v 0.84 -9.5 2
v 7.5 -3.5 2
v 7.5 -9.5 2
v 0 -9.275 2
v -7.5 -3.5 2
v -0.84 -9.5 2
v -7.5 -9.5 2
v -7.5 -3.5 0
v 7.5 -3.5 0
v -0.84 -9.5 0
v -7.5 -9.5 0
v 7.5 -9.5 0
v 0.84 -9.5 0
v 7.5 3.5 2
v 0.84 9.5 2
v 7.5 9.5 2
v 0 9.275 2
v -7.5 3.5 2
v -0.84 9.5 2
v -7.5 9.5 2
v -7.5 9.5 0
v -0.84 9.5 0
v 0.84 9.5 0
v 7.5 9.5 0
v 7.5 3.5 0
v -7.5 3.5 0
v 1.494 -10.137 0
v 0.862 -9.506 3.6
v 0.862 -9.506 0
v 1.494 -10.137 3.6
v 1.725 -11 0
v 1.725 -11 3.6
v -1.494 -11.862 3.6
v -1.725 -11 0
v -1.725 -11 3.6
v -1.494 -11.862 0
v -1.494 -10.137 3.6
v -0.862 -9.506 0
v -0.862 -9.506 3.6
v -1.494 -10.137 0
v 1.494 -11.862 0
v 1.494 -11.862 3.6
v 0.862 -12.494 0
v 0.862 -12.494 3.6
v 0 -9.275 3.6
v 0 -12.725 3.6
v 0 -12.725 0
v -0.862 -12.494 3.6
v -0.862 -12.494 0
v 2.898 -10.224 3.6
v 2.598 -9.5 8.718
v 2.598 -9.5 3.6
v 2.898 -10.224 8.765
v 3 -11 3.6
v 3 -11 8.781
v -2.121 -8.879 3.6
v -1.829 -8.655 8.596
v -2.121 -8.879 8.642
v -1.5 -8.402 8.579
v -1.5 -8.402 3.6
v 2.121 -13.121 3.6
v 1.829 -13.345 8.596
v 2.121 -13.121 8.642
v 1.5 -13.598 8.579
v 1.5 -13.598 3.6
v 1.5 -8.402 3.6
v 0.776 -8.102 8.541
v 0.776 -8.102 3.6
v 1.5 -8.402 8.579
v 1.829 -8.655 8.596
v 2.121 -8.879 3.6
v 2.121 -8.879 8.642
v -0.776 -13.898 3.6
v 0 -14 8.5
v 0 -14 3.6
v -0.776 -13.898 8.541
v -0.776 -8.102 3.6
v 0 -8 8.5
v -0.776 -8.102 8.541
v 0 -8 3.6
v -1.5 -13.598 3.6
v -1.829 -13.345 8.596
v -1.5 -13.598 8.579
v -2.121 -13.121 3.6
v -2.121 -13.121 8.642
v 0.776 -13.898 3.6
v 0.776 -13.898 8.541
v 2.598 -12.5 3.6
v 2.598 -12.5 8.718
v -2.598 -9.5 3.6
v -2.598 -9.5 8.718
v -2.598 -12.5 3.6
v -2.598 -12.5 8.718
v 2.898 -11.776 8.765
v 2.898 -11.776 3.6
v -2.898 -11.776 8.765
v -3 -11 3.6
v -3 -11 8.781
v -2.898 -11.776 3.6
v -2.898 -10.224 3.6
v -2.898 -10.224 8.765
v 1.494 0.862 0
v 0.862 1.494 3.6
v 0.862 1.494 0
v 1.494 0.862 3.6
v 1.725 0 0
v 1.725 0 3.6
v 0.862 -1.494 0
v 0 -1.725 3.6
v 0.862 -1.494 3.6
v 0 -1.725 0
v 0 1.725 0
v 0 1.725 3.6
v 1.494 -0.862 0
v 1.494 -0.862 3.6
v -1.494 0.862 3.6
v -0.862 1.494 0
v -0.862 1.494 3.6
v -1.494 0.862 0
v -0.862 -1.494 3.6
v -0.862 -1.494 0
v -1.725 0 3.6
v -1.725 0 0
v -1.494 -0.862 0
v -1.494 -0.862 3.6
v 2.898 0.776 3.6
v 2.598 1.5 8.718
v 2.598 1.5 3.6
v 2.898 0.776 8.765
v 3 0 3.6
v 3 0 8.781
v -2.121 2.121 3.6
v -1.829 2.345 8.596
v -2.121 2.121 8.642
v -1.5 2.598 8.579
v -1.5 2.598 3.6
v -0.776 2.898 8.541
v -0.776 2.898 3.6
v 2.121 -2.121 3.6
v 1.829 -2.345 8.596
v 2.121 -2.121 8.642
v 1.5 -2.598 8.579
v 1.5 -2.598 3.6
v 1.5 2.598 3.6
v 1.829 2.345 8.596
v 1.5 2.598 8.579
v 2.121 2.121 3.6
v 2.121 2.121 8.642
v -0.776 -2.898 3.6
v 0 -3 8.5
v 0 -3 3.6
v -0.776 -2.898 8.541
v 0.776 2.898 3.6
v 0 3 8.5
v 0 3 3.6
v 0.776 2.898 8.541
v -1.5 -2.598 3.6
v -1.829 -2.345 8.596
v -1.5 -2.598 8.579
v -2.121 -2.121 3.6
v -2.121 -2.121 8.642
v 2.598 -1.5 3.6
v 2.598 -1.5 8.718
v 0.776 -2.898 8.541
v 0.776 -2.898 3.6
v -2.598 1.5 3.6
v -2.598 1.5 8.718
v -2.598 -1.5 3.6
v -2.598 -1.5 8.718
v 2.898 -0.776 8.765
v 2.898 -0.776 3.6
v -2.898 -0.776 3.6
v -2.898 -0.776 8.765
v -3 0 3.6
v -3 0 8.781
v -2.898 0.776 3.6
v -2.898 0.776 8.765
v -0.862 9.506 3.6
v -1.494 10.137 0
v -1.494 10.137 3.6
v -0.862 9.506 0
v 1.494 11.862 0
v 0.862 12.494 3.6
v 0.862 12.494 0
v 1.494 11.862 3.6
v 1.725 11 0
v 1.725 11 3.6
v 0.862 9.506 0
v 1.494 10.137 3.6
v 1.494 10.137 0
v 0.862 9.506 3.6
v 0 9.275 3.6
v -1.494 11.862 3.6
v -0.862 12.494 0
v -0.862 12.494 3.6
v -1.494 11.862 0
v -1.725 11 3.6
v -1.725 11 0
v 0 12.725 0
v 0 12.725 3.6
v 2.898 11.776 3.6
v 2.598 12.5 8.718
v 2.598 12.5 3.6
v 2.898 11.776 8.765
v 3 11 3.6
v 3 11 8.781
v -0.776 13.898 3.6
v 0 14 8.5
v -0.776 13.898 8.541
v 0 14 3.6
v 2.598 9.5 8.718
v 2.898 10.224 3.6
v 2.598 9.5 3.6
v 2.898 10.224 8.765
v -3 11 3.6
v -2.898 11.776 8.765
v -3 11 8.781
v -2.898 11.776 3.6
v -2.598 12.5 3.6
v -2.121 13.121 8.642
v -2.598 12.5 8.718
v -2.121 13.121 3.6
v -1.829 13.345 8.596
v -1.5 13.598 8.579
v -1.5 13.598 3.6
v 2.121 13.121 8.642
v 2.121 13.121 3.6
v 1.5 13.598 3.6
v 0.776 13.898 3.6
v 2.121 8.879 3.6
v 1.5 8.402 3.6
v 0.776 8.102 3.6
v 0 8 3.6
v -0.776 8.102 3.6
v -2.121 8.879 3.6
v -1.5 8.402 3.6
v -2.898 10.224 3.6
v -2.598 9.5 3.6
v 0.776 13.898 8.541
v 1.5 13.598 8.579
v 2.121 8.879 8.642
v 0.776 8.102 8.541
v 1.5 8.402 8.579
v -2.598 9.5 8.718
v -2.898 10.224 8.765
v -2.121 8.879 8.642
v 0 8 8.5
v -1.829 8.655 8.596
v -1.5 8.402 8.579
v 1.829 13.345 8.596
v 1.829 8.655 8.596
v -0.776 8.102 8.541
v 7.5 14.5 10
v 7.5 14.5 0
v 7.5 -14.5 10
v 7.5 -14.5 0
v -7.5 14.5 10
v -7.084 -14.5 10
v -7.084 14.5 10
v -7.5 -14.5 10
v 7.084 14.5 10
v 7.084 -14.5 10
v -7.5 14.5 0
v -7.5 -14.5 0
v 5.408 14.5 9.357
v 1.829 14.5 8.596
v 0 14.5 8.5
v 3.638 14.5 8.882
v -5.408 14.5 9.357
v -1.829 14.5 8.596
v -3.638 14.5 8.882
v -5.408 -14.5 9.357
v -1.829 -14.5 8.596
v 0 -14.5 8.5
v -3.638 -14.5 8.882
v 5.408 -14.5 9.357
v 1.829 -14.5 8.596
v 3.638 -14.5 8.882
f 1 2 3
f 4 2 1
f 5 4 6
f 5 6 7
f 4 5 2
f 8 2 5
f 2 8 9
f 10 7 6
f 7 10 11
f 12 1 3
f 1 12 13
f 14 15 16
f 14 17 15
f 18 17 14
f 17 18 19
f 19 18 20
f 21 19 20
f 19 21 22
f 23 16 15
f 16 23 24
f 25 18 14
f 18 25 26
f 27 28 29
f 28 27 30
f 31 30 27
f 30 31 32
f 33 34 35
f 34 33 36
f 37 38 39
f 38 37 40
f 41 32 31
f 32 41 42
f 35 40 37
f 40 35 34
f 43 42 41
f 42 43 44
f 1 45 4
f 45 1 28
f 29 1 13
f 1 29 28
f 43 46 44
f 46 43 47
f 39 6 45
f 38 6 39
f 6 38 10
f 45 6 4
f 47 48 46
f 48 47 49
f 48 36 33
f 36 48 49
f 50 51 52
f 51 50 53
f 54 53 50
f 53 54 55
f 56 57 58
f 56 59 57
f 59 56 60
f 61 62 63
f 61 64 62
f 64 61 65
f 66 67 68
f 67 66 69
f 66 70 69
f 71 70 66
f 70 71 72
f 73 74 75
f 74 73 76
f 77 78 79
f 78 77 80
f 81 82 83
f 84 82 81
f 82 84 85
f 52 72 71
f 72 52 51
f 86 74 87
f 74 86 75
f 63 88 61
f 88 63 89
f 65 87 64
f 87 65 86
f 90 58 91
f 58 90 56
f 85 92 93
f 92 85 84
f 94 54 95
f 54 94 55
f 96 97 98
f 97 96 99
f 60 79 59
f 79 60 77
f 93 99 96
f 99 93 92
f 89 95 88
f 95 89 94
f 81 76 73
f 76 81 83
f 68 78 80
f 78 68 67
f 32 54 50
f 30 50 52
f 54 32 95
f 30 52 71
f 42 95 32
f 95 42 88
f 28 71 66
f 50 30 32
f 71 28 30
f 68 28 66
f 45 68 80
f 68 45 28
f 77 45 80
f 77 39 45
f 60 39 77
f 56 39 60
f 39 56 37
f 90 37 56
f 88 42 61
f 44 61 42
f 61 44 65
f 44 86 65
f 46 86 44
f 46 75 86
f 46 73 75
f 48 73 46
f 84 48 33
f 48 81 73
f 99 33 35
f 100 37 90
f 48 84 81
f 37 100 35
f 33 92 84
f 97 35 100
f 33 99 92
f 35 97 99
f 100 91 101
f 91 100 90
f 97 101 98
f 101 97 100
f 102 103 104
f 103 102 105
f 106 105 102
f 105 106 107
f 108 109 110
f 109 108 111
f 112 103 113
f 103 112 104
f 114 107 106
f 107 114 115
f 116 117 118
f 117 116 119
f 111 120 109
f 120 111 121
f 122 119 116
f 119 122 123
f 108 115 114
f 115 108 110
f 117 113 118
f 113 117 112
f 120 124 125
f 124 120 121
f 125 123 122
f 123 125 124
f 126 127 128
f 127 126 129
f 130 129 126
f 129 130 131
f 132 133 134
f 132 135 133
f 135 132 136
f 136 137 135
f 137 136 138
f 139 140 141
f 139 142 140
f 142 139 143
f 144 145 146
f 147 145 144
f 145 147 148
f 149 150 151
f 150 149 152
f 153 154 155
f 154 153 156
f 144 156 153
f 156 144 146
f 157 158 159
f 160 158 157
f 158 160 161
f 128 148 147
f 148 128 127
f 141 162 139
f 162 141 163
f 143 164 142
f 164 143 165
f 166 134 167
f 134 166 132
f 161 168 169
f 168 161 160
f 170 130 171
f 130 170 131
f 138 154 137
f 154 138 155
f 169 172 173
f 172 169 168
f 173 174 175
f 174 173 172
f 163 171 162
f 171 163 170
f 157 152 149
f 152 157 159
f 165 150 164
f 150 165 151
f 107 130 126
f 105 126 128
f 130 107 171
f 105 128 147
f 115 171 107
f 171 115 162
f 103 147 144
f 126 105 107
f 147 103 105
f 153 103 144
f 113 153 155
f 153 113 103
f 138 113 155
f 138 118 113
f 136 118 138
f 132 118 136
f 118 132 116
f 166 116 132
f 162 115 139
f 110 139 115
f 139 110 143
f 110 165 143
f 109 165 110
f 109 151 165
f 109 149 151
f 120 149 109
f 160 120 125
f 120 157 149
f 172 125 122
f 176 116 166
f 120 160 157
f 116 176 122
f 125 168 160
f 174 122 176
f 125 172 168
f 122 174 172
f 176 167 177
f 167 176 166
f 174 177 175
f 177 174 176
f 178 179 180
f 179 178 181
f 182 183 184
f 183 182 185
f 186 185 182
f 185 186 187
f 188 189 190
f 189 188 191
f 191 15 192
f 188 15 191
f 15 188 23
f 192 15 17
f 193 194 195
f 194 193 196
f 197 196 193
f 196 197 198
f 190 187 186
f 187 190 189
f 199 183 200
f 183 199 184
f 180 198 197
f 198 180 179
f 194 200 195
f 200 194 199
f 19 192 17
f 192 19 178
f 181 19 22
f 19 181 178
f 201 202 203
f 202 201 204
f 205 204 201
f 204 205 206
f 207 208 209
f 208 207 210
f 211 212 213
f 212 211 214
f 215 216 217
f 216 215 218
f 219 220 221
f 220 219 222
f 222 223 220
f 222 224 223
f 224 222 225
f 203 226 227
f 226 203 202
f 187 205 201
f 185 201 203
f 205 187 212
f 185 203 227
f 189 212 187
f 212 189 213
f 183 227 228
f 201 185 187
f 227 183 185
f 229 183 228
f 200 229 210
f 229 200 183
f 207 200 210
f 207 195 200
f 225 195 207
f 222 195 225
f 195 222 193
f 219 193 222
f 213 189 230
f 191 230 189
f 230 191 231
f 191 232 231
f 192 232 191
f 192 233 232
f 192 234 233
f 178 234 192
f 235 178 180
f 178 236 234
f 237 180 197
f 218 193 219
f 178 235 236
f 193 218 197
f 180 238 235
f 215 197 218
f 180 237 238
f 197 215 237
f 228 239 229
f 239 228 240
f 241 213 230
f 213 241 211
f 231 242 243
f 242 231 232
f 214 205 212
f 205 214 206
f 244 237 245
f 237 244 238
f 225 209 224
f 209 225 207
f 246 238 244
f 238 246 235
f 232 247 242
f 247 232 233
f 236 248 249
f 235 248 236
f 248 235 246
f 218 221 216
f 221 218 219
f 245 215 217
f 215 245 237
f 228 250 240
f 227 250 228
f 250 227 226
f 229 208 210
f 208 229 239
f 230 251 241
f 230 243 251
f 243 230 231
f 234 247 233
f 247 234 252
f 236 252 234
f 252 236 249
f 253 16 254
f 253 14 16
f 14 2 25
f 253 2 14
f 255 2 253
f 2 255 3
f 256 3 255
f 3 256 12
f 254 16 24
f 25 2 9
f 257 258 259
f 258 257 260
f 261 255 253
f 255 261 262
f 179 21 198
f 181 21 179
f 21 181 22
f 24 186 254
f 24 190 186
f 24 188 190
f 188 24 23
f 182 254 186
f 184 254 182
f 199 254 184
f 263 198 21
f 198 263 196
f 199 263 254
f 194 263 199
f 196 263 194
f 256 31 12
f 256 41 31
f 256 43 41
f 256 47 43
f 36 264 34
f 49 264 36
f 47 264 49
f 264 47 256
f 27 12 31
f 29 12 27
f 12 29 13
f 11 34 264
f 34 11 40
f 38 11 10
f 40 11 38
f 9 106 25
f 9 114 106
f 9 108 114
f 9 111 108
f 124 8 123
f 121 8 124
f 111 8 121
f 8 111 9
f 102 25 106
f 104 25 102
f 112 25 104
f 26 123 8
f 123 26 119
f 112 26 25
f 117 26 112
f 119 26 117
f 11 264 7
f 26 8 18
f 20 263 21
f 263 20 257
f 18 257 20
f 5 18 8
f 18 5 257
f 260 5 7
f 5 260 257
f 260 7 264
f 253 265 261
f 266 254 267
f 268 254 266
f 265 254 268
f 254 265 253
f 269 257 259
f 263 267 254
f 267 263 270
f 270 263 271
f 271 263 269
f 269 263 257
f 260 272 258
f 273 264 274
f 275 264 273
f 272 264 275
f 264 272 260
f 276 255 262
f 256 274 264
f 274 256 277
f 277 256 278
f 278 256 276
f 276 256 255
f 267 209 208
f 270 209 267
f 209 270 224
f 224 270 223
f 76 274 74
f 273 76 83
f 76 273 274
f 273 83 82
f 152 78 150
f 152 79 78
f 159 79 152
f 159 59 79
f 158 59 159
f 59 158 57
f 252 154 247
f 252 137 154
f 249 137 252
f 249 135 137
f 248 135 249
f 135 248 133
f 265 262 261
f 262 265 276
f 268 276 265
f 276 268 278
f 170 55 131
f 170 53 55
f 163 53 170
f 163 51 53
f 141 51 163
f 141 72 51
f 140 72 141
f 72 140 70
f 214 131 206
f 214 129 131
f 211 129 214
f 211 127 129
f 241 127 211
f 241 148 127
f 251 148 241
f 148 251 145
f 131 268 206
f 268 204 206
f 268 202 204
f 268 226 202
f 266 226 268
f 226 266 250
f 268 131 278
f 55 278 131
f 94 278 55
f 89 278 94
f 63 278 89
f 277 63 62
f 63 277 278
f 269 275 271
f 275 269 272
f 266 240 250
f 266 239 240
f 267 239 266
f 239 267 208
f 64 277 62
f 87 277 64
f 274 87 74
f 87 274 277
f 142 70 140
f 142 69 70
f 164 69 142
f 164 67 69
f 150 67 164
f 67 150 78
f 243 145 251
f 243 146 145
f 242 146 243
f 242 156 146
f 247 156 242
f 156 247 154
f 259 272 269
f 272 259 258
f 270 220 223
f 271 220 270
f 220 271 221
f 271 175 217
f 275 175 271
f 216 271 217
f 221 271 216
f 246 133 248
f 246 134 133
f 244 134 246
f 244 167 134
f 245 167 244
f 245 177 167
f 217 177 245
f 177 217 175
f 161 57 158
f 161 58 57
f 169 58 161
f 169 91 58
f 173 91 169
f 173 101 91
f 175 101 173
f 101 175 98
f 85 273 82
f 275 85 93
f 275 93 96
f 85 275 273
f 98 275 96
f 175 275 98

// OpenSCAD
// file: ../include/configuration.scad
// Increase this if your slicer or printer make holes too tight.
extra_radius = 0.1;

// OD = outside diameter, corner to corner.
m3_nut_od = 6.1;
m3_nut_radius = m3_nut_od/2 + 0.2 + extra_radius;
m3_washer_radius = 3.5 + extra_radius;

// Major diameter of metric 3mm thread.
m3_major = 2.85;
m3_radius = m3_major/2 + extra_radius;
m3_wide_radius = m3_major/2 + extra_radius + 0.2;

// NEMA17 stepper motors.
motor_shaft_diameter = 5;
motor_shaft_radius = motor_shaft_diameter/2 + extra_radius;

// Frame brackets. M3x8mm screws work best with 3.6 mm brackets.
thickness = 3.6;

// OpenBeam or Misumi. Currently only 15x15 mm, but there is a plan
// to make models more parametric and allow 20x20 mm in the future.
extrusion = 15;

// Placement for the NEMA17 stepper motors.
motor_offset = 44;
motor_length = 47;
// main file
include <../include/configuration.scad>;

module frame_extruder() {
  difference() {
    union() {
      translate([0, 0, 5]) cube([15, 29, 10], center=true);
    }
    translate([0, 0, 26]) rotate([90, 0, 0])
      cylinder(r=17.5, h=30, center=true, $fn=60);
    for (y = [-6.5, 6.5]) {
      translate([0, y, 0])
        cube([20, 6, 4], center=true);
    }
    for (y = [-11, 0, 11]) {
      translate([0, y, 0])
        cylinder(r=m3_wide_radius, h=20, center=true, $fn=12);
      translate([0, y, thickness])
        # cylinder(r=3, h=10, $fn=24);
    }
  }
}

frame_extruder();
